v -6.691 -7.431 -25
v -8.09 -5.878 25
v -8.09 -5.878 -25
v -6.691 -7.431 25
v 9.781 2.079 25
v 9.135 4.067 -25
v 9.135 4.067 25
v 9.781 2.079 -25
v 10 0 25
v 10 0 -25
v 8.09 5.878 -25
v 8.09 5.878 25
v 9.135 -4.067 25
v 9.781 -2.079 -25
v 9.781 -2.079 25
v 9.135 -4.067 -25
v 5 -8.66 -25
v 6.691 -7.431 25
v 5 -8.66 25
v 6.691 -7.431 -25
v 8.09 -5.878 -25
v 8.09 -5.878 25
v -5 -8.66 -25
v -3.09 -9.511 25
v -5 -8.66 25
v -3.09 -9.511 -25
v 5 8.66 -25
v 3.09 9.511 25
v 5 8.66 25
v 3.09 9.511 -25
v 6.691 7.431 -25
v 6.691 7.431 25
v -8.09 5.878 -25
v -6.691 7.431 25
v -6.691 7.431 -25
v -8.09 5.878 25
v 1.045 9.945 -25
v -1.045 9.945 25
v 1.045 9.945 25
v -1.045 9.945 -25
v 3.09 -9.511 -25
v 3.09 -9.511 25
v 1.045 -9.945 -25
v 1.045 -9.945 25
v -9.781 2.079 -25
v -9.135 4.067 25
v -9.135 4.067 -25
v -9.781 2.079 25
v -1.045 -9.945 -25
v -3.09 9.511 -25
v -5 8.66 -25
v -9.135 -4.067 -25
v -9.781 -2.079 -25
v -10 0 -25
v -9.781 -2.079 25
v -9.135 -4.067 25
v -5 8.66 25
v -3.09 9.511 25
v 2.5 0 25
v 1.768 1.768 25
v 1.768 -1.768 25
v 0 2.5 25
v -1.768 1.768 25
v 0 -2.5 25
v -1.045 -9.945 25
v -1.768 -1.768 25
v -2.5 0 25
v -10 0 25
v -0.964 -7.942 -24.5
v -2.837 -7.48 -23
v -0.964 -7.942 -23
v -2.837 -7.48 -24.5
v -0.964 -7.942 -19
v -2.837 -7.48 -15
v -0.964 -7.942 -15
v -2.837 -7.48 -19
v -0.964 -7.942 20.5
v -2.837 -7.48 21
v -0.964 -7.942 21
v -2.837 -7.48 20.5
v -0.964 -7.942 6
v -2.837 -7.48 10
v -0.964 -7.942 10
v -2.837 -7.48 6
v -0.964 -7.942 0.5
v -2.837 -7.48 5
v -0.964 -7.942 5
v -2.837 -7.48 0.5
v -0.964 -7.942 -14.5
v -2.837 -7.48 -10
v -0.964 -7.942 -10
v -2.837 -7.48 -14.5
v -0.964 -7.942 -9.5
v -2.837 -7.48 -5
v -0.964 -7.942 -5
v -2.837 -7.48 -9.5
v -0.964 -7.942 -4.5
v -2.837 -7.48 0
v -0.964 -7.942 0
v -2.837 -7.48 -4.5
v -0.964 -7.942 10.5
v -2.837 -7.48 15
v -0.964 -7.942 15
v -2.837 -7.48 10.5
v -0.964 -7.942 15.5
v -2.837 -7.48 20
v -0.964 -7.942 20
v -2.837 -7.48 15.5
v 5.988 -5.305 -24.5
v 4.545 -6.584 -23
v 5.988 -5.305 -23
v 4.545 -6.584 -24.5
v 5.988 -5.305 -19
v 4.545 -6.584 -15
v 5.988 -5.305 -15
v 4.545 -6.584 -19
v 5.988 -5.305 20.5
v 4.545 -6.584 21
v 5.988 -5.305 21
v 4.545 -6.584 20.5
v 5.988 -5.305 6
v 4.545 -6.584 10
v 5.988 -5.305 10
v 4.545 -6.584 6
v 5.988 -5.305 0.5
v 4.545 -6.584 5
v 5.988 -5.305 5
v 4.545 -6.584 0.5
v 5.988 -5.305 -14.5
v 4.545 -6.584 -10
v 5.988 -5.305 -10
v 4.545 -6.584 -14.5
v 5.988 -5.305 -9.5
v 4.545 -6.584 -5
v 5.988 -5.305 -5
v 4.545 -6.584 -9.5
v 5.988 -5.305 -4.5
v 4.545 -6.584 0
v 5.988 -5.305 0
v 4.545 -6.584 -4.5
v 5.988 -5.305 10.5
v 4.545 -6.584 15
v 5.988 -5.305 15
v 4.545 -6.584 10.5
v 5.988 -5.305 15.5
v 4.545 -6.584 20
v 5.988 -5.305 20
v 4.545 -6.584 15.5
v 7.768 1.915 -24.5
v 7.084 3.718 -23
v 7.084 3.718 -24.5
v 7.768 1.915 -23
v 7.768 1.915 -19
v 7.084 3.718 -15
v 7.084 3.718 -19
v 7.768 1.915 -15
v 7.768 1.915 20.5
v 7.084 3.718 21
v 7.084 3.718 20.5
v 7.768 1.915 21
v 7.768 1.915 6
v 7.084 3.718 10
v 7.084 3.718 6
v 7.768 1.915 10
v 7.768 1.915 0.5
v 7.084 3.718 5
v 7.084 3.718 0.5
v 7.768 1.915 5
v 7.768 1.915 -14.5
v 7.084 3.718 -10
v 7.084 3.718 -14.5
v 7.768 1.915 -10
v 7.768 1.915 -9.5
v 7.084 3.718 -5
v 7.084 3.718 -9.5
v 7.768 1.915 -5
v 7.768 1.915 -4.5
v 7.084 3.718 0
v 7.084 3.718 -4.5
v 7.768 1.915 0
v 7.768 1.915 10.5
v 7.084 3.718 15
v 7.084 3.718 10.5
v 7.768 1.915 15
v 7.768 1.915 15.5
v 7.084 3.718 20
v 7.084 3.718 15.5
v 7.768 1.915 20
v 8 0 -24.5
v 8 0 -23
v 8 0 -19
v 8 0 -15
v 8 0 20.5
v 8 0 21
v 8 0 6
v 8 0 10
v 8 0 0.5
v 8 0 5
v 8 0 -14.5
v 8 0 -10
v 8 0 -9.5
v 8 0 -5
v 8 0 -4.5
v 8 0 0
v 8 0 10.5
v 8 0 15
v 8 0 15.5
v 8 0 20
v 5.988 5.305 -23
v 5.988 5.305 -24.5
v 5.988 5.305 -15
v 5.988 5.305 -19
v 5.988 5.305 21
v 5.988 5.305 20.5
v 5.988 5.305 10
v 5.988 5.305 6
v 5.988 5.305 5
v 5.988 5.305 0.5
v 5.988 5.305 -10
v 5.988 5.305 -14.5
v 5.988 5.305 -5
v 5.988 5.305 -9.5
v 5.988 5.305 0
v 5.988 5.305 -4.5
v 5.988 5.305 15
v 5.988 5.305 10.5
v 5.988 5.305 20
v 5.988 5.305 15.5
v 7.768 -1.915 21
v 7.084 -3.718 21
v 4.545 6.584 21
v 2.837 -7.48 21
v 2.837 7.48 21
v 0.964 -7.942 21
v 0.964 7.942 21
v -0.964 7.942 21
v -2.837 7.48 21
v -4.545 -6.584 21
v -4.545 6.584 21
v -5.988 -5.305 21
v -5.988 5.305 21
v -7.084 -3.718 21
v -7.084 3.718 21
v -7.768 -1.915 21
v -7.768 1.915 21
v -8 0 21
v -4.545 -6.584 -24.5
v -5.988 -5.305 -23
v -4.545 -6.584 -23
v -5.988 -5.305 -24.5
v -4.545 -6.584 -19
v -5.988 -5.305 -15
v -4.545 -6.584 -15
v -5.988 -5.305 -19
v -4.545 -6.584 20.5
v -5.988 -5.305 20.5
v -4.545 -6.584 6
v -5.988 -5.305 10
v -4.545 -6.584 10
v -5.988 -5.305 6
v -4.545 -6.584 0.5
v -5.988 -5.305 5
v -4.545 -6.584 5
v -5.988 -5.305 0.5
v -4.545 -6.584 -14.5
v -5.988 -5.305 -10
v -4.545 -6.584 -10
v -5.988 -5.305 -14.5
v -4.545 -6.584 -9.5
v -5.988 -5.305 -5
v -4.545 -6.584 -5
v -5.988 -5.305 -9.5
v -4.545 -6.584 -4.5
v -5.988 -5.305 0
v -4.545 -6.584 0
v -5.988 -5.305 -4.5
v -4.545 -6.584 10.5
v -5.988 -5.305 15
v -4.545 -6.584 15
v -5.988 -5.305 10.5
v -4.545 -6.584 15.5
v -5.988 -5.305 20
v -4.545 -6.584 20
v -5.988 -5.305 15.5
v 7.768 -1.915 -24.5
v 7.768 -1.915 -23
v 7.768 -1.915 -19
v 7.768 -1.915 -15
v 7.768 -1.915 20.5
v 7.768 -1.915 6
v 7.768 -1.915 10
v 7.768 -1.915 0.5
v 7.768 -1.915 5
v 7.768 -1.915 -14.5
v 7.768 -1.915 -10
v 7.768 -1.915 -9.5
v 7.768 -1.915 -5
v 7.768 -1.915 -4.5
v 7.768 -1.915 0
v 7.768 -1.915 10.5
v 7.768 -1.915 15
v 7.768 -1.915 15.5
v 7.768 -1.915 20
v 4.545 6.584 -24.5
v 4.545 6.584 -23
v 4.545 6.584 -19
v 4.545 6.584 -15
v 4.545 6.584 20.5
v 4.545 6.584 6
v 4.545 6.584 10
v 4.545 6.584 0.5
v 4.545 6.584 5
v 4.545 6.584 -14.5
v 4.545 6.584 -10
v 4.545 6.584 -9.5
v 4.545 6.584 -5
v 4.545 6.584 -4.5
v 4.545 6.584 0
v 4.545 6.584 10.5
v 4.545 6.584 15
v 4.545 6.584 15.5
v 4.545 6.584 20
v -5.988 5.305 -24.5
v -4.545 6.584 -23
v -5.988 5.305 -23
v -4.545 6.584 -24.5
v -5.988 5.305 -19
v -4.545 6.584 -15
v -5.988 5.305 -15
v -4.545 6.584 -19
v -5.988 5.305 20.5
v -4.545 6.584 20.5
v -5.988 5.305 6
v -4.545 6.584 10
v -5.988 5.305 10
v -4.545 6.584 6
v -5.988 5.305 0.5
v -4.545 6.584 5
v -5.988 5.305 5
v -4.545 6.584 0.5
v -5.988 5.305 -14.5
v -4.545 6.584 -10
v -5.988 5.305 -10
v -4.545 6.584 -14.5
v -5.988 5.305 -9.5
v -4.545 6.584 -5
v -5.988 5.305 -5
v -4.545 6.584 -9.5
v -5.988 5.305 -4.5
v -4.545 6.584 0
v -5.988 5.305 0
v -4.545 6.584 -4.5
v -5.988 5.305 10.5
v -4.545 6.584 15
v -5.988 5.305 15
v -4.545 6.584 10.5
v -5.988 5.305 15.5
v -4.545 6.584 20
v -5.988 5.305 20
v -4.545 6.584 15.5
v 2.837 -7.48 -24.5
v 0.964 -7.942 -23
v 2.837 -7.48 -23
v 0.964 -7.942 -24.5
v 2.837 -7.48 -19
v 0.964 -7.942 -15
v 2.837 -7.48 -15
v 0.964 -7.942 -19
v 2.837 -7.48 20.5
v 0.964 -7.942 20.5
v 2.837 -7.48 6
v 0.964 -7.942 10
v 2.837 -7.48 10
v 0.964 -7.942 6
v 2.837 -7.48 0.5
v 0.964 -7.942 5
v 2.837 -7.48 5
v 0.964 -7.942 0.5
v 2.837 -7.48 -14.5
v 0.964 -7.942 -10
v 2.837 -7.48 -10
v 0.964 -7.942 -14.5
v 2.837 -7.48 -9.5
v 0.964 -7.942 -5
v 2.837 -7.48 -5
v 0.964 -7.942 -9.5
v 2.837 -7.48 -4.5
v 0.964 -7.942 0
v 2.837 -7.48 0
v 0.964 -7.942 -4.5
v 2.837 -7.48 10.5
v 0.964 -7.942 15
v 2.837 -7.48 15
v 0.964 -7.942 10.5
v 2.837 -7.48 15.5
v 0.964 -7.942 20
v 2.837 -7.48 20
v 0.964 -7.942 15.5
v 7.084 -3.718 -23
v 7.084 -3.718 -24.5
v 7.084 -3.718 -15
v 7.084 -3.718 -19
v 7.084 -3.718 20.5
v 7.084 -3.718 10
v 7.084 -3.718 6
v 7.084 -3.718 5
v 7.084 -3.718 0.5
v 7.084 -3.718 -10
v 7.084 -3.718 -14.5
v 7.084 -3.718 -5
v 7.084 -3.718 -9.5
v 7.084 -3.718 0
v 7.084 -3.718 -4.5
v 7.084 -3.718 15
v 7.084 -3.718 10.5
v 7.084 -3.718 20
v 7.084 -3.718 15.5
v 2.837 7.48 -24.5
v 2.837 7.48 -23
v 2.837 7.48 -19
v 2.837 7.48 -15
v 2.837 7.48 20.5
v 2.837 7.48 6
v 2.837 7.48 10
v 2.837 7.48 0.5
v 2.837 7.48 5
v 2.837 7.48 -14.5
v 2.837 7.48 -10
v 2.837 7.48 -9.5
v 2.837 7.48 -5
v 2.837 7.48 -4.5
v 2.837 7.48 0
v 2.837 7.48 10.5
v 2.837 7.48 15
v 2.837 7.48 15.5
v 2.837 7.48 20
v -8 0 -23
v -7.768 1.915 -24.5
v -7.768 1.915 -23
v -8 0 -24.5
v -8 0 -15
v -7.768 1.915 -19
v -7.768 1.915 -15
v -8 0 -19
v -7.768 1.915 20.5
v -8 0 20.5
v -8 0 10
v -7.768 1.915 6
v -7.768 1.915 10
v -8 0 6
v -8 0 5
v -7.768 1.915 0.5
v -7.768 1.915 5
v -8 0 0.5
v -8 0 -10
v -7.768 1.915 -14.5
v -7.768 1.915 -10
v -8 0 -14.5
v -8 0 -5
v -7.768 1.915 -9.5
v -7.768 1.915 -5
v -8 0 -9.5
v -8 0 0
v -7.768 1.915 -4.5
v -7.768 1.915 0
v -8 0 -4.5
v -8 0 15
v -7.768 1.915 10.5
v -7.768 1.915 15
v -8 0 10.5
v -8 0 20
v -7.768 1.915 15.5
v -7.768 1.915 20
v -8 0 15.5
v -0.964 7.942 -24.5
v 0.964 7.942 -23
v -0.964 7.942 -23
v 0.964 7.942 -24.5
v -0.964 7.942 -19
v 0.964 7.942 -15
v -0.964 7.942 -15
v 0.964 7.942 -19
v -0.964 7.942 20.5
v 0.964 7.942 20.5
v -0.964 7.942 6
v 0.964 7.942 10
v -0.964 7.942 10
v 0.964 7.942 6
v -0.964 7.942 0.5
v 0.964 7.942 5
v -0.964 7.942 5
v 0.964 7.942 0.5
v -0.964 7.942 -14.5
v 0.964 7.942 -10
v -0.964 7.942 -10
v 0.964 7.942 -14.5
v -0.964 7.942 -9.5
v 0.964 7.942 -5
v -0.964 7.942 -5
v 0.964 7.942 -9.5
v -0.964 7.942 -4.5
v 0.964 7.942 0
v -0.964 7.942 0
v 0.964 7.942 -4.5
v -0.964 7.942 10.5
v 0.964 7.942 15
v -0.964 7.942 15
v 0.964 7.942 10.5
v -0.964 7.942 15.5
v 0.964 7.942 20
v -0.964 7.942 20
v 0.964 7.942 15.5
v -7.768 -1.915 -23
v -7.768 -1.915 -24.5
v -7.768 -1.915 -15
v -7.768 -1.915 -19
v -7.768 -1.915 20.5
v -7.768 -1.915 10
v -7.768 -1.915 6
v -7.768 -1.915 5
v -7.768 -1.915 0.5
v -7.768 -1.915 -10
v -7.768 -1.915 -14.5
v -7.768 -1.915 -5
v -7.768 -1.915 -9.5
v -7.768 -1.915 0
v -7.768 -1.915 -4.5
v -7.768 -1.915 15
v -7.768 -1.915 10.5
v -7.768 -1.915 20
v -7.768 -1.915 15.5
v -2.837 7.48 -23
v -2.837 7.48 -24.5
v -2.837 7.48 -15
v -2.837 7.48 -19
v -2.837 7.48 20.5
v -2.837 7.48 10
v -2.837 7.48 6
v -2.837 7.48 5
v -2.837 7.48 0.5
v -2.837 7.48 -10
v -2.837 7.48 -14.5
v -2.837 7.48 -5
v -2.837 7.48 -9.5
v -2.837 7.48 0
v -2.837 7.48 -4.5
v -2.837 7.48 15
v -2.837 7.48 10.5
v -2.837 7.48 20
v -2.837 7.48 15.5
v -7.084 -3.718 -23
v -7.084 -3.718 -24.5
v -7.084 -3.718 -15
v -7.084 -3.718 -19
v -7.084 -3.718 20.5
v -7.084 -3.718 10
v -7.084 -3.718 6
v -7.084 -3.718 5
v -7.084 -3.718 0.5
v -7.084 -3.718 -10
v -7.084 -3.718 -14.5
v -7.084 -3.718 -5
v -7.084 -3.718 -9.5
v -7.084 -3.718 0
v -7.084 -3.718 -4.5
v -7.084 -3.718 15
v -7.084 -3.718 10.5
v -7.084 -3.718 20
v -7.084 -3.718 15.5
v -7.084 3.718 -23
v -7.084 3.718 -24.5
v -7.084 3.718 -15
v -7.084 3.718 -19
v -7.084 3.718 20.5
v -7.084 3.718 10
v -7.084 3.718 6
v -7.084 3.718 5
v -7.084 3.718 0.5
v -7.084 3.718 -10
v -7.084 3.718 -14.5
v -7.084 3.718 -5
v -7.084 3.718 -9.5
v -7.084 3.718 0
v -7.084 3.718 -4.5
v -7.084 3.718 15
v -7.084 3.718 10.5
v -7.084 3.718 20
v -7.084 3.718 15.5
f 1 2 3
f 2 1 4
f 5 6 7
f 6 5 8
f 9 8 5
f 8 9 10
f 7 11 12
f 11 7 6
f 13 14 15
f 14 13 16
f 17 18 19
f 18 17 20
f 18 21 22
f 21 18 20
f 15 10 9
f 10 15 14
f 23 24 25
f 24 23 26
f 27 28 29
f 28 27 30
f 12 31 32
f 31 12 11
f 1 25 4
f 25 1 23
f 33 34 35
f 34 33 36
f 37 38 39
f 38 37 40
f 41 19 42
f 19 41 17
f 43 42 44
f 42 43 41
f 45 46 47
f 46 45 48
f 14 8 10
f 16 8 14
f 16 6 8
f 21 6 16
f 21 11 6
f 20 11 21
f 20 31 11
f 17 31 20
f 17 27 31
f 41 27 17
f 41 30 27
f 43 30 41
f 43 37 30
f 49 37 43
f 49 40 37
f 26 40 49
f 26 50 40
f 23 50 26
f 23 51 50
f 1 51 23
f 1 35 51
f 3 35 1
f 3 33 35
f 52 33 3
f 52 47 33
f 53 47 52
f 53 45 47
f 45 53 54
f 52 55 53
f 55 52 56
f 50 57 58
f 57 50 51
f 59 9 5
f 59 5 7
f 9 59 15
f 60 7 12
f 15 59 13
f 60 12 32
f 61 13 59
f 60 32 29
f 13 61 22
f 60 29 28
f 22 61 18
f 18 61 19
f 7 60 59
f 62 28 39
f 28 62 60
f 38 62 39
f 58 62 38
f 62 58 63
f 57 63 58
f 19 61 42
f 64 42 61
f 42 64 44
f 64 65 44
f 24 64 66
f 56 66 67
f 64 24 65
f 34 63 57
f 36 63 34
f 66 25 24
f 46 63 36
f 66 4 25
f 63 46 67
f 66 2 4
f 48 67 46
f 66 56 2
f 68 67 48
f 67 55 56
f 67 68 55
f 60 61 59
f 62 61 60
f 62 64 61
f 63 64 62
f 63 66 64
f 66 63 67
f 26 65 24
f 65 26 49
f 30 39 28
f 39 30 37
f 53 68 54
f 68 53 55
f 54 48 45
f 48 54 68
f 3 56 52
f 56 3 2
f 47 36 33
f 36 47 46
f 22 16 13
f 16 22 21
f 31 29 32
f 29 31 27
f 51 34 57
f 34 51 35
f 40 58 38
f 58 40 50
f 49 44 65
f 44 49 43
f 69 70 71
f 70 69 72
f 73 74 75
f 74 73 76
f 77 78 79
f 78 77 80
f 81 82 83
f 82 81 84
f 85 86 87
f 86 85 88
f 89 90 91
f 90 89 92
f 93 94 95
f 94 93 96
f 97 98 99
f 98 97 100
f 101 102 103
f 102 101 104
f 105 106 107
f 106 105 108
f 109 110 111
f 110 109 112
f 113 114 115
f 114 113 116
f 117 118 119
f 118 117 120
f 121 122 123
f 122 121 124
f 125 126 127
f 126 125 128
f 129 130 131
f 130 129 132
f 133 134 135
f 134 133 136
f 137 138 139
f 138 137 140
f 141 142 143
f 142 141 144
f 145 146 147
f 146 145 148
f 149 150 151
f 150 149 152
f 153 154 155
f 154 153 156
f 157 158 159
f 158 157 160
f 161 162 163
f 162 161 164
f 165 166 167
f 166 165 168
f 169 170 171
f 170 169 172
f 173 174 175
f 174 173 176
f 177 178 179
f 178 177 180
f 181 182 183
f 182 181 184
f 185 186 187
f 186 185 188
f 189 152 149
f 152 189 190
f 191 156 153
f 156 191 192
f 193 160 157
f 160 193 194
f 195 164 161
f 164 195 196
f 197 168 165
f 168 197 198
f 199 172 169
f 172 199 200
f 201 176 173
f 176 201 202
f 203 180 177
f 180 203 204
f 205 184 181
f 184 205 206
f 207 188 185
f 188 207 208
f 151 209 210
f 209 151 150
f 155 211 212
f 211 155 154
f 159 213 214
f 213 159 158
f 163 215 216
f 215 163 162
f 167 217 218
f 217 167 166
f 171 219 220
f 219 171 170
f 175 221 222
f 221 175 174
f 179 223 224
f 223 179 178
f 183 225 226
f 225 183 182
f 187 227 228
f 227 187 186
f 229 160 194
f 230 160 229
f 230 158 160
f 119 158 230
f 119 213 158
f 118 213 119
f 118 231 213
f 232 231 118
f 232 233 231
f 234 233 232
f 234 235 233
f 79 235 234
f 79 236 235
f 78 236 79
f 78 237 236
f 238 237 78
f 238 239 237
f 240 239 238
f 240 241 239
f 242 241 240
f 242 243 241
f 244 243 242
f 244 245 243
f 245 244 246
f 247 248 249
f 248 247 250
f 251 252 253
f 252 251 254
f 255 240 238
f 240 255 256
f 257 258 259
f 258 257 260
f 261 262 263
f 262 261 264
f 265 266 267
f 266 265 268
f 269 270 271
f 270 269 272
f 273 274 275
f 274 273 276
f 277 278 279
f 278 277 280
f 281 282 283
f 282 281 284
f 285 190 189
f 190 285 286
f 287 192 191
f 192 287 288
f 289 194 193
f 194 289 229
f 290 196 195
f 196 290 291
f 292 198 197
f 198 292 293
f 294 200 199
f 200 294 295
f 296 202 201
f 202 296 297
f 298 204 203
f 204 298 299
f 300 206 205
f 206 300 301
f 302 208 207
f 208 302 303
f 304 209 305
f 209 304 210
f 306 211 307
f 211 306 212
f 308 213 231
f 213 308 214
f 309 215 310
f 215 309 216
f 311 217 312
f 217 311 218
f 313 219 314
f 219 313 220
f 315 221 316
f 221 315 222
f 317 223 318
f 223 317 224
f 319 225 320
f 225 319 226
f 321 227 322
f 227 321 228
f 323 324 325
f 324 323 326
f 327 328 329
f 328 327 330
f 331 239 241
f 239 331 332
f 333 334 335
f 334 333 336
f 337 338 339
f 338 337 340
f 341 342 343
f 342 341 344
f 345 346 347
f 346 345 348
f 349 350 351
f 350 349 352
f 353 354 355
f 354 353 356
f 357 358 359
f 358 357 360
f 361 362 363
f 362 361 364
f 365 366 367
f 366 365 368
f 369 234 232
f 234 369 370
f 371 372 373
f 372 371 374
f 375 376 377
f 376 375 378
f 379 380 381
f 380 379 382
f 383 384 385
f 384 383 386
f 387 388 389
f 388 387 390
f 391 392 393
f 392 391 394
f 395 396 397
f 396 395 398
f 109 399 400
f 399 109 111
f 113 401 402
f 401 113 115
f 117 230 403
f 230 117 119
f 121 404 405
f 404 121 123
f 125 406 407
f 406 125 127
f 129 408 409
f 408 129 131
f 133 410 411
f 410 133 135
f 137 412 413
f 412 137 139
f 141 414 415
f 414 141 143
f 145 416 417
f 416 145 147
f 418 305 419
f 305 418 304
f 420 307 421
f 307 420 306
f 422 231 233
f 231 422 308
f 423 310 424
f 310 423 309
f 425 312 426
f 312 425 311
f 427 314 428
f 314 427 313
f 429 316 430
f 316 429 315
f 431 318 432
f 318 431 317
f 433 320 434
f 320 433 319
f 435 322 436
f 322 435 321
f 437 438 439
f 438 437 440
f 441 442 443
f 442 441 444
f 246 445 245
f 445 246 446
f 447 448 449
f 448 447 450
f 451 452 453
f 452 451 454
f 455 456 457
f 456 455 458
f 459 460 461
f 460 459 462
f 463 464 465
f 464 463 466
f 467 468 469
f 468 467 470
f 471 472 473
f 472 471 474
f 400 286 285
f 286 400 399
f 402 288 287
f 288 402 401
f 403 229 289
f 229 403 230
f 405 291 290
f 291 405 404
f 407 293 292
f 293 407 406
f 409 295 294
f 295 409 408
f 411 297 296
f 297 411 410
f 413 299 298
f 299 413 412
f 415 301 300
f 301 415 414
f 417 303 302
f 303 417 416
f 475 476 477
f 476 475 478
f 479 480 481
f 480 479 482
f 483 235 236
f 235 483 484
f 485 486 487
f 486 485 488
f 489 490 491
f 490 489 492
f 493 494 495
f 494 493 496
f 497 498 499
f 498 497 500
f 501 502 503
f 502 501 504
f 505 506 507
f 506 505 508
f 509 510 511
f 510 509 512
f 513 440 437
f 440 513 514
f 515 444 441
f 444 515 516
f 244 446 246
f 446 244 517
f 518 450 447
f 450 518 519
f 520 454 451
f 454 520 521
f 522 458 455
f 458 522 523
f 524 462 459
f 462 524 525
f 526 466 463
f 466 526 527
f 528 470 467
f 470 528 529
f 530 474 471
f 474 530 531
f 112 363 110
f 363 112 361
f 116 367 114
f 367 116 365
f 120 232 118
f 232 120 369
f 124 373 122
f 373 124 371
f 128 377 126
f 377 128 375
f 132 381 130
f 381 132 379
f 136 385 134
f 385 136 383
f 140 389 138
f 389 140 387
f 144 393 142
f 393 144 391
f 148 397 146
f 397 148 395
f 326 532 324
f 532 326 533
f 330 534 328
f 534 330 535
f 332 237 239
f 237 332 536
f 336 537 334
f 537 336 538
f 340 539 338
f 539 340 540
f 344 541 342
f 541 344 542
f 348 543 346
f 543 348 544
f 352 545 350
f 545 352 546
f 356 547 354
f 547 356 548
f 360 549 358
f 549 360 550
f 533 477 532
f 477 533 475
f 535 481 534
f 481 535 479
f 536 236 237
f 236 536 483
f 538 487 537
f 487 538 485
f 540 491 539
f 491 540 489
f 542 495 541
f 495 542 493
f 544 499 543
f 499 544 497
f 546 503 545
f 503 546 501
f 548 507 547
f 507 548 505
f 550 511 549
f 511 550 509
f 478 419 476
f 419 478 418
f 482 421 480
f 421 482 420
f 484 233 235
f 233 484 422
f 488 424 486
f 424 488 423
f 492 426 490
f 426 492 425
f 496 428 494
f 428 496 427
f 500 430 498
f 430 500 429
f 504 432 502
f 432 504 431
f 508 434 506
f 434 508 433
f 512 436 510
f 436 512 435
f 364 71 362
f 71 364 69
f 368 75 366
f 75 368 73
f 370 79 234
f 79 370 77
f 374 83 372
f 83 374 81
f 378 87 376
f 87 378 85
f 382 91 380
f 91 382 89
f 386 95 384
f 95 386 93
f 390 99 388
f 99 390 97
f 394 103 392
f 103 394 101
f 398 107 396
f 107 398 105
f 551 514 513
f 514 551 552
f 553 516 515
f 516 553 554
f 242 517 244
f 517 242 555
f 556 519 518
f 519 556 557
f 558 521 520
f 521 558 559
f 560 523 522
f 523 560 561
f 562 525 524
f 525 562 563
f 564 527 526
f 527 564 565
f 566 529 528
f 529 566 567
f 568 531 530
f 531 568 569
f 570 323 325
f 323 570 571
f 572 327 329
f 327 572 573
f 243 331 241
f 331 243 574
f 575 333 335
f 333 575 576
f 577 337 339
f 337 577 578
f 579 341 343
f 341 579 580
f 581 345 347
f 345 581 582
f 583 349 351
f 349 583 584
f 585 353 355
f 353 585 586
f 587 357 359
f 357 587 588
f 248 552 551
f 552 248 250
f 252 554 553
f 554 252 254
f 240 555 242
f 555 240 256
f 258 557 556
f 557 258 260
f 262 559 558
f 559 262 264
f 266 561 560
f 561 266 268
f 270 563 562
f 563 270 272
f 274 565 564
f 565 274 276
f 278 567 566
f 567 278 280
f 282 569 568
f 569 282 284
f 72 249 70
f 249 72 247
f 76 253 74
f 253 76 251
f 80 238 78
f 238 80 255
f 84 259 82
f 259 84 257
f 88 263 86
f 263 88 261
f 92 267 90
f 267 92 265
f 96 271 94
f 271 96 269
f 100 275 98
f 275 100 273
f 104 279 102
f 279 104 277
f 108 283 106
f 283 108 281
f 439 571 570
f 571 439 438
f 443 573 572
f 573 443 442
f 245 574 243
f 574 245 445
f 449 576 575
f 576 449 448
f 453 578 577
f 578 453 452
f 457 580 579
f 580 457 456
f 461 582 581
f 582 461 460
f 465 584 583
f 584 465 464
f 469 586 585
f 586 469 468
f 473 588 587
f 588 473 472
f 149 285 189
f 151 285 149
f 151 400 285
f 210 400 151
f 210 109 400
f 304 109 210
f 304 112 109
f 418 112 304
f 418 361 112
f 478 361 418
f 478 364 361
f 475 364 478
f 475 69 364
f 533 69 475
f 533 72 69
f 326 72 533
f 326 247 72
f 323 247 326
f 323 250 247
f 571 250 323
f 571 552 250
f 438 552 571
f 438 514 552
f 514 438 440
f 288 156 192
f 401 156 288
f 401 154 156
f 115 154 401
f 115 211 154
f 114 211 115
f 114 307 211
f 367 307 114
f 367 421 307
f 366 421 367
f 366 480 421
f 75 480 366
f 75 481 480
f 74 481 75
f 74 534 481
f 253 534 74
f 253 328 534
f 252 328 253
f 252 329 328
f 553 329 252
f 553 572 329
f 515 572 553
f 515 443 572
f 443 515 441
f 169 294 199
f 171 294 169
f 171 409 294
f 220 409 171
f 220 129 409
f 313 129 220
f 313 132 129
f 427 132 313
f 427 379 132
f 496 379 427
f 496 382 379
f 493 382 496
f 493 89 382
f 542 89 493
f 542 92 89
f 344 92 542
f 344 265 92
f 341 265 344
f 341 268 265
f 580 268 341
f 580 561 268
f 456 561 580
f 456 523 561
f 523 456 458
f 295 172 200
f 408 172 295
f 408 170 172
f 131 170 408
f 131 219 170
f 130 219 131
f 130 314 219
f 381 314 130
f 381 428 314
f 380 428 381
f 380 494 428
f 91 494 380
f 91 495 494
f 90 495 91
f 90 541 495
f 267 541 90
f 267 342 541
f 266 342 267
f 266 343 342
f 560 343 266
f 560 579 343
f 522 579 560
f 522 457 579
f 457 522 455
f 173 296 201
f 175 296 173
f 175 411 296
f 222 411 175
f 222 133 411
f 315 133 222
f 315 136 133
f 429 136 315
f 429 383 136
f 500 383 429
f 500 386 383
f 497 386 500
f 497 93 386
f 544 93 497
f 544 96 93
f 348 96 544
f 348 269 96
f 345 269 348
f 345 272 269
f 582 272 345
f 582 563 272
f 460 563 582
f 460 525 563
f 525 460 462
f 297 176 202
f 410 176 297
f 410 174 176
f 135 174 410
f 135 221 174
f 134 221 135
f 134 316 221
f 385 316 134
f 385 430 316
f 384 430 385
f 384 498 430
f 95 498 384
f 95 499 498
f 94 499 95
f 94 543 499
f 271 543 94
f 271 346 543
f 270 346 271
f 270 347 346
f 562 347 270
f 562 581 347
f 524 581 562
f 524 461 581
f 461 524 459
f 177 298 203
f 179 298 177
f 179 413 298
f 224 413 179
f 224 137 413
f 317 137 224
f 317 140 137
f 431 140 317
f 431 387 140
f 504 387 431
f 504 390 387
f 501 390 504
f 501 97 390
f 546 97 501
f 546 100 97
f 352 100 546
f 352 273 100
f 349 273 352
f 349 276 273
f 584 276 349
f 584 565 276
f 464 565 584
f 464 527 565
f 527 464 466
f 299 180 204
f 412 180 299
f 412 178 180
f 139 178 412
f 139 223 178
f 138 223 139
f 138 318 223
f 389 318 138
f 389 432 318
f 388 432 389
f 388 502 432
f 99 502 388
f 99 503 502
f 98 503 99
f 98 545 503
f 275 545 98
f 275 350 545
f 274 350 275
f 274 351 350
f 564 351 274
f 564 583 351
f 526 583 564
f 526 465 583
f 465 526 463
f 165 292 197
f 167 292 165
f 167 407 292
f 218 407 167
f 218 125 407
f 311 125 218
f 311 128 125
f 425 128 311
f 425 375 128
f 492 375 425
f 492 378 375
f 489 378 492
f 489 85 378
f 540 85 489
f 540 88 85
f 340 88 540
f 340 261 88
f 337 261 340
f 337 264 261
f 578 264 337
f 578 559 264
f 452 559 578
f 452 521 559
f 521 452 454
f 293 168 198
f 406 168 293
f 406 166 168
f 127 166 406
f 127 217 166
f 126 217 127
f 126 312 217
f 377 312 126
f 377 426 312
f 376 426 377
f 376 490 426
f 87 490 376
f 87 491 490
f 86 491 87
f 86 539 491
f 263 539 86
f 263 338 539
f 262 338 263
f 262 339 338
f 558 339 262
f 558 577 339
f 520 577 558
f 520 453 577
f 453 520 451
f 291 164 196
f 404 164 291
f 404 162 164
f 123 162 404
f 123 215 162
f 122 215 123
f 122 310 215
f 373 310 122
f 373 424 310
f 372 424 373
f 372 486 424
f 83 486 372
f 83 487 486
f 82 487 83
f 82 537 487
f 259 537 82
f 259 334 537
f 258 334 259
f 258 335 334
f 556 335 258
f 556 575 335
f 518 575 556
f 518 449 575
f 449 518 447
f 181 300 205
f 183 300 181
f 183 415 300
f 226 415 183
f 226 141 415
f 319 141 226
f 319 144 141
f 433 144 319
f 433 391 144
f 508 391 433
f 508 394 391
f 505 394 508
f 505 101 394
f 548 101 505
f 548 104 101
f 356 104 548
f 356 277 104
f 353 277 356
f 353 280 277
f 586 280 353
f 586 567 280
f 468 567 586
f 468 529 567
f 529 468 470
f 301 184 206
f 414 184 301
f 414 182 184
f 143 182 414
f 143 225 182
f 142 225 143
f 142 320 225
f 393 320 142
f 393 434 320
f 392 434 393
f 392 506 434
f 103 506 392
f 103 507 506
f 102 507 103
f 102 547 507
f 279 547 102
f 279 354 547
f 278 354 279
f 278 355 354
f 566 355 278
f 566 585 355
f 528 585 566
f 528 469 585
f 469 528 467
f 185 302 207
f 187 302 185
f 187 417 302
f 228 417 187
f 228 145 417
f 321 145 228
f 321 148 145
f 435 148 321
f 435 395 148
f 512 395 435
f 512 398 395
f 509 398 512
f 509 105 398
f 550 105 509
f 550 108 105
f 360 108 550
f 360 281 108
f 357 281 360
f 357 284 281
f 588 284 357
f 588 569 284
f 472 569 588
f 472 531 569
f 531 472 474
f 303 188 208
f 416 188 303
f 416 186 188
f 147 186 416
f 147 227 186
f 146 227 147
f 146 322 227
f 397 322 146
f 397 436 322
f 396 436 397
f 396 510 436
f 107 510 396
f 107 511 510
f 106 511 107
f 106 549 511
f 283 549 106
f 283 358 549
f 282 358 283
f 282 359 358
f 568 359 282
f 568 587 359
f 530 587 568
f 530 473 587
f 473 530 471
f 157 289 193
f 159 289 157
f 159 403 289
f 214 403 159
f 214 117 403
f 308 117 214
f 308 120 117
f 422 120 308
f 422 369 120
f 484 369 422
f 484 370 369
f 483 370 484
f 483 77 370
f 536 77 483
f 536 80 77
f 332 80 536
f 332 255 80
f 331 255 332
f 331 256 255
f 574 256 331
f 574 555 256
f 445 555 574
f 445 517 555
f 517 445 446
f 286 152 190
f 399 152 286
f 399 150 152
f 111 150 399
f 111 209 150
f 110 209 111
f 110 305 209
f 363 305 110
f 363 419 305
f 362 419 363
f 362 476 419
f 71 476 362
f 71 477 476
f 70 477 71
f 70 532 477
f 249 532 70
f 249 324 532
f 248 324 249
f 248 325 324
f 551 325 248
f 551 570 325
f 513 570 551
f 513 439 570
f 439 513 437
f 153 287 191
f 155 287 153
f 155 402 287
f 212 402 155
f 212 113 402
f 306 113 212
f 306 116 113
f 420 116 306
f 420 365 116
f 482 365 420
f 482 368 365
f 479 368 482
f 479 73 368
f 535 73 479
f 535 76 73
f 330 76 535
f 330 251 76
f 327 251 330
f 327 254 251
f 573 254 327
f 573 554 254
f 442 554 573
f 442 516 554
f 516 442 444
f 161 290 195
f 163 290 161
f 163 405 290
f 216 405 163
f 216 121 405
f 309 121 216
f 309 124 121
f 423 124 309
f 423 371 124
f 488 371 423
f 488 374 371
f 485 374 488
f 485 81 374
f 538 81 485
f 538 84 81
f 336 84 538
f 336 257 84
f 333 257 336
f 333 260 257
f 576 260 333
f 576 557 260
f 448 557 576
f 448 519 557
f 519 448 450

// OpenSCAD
union() {
	difference() {
		cylinder(center = true, h = 50, r = 10.0000000000);
		translate(v = [0, 0, -25.0000000000]) {
			cylinder(center = false, h = 46, r = 8.0000000000);
		}
		translate(v = [0, 0, 25.0000000000]) {
			cylinder(center = false, h = 50, r = 2.5000000000);
		}
	}
	translate(v = [0, 0, -23.0000000000]) {
		cylinder(center = false, h = 2, r = 8.0000000000);
	}
	translate(v = [0, 0, -22.5000000000]) {
		cylinder(center = false, h = 1, r = 7.0000000000);
	}
	translate(v = [0, 0, -21.0000000000]) {
		cylinder(center = false, h = 2, r = 8.0000000000);
	}
	union() {
		translate(v = [0, 0, -25.0000000000]) {
			cylinder(center = false, h = 0.5000000000, r = 10.0000000000);
		}
		translate(v = [0, 0, -20.0000000000]) {
			cylinder(center = false, h = 0.5000000000, r = 10.0000000000);
		}
		translate(v = [0, 0, -15.0000000000]) {
			cylinder(center = false, h = 0.5000000000, r = 10.0000000000);
		}
		translate(v = [0, 0, -10.0000000000]) {
			cylinder(center = false, h = 0.5000000000, r = 10.0000000000);
		}
		translate(v = [0, 0, -5.0000000000]) {
			cylinder(center = false, h = 0.5000000000, r = 10.0000000000);
		}
		translate(v = [0, 0, 0.0000000000]) {
			cylinder(center = false, h = 0.5000000000, r = 10.0000000000);
		}
		translate(v = [0, 0, 5.0000000000]) {
			cylinder(center = false, h = 0.5000000000, r = 10.0000000000);
		}
		translate(v = [0, 0, 10.0000000000]) {
			cylinder(center = false, h = 0.5000000000, r = 10.0000000000);
		}
		translate(v = [0, 0, 15.0000000000]) {
			cylinder(center = false, h = 0.5000000000, r = 10.0000000000);
		}
		translate(v = [0, 0, 20.0000000000]) {
			cylinder(center = false, h = 0.5000000000, r = 10.0000000000);
		}
	}
	translate(v = [0, 0, 5.0000000000]) {
		cylinder(center = false, h = 1, r = 9.0000000000);
	}
}
